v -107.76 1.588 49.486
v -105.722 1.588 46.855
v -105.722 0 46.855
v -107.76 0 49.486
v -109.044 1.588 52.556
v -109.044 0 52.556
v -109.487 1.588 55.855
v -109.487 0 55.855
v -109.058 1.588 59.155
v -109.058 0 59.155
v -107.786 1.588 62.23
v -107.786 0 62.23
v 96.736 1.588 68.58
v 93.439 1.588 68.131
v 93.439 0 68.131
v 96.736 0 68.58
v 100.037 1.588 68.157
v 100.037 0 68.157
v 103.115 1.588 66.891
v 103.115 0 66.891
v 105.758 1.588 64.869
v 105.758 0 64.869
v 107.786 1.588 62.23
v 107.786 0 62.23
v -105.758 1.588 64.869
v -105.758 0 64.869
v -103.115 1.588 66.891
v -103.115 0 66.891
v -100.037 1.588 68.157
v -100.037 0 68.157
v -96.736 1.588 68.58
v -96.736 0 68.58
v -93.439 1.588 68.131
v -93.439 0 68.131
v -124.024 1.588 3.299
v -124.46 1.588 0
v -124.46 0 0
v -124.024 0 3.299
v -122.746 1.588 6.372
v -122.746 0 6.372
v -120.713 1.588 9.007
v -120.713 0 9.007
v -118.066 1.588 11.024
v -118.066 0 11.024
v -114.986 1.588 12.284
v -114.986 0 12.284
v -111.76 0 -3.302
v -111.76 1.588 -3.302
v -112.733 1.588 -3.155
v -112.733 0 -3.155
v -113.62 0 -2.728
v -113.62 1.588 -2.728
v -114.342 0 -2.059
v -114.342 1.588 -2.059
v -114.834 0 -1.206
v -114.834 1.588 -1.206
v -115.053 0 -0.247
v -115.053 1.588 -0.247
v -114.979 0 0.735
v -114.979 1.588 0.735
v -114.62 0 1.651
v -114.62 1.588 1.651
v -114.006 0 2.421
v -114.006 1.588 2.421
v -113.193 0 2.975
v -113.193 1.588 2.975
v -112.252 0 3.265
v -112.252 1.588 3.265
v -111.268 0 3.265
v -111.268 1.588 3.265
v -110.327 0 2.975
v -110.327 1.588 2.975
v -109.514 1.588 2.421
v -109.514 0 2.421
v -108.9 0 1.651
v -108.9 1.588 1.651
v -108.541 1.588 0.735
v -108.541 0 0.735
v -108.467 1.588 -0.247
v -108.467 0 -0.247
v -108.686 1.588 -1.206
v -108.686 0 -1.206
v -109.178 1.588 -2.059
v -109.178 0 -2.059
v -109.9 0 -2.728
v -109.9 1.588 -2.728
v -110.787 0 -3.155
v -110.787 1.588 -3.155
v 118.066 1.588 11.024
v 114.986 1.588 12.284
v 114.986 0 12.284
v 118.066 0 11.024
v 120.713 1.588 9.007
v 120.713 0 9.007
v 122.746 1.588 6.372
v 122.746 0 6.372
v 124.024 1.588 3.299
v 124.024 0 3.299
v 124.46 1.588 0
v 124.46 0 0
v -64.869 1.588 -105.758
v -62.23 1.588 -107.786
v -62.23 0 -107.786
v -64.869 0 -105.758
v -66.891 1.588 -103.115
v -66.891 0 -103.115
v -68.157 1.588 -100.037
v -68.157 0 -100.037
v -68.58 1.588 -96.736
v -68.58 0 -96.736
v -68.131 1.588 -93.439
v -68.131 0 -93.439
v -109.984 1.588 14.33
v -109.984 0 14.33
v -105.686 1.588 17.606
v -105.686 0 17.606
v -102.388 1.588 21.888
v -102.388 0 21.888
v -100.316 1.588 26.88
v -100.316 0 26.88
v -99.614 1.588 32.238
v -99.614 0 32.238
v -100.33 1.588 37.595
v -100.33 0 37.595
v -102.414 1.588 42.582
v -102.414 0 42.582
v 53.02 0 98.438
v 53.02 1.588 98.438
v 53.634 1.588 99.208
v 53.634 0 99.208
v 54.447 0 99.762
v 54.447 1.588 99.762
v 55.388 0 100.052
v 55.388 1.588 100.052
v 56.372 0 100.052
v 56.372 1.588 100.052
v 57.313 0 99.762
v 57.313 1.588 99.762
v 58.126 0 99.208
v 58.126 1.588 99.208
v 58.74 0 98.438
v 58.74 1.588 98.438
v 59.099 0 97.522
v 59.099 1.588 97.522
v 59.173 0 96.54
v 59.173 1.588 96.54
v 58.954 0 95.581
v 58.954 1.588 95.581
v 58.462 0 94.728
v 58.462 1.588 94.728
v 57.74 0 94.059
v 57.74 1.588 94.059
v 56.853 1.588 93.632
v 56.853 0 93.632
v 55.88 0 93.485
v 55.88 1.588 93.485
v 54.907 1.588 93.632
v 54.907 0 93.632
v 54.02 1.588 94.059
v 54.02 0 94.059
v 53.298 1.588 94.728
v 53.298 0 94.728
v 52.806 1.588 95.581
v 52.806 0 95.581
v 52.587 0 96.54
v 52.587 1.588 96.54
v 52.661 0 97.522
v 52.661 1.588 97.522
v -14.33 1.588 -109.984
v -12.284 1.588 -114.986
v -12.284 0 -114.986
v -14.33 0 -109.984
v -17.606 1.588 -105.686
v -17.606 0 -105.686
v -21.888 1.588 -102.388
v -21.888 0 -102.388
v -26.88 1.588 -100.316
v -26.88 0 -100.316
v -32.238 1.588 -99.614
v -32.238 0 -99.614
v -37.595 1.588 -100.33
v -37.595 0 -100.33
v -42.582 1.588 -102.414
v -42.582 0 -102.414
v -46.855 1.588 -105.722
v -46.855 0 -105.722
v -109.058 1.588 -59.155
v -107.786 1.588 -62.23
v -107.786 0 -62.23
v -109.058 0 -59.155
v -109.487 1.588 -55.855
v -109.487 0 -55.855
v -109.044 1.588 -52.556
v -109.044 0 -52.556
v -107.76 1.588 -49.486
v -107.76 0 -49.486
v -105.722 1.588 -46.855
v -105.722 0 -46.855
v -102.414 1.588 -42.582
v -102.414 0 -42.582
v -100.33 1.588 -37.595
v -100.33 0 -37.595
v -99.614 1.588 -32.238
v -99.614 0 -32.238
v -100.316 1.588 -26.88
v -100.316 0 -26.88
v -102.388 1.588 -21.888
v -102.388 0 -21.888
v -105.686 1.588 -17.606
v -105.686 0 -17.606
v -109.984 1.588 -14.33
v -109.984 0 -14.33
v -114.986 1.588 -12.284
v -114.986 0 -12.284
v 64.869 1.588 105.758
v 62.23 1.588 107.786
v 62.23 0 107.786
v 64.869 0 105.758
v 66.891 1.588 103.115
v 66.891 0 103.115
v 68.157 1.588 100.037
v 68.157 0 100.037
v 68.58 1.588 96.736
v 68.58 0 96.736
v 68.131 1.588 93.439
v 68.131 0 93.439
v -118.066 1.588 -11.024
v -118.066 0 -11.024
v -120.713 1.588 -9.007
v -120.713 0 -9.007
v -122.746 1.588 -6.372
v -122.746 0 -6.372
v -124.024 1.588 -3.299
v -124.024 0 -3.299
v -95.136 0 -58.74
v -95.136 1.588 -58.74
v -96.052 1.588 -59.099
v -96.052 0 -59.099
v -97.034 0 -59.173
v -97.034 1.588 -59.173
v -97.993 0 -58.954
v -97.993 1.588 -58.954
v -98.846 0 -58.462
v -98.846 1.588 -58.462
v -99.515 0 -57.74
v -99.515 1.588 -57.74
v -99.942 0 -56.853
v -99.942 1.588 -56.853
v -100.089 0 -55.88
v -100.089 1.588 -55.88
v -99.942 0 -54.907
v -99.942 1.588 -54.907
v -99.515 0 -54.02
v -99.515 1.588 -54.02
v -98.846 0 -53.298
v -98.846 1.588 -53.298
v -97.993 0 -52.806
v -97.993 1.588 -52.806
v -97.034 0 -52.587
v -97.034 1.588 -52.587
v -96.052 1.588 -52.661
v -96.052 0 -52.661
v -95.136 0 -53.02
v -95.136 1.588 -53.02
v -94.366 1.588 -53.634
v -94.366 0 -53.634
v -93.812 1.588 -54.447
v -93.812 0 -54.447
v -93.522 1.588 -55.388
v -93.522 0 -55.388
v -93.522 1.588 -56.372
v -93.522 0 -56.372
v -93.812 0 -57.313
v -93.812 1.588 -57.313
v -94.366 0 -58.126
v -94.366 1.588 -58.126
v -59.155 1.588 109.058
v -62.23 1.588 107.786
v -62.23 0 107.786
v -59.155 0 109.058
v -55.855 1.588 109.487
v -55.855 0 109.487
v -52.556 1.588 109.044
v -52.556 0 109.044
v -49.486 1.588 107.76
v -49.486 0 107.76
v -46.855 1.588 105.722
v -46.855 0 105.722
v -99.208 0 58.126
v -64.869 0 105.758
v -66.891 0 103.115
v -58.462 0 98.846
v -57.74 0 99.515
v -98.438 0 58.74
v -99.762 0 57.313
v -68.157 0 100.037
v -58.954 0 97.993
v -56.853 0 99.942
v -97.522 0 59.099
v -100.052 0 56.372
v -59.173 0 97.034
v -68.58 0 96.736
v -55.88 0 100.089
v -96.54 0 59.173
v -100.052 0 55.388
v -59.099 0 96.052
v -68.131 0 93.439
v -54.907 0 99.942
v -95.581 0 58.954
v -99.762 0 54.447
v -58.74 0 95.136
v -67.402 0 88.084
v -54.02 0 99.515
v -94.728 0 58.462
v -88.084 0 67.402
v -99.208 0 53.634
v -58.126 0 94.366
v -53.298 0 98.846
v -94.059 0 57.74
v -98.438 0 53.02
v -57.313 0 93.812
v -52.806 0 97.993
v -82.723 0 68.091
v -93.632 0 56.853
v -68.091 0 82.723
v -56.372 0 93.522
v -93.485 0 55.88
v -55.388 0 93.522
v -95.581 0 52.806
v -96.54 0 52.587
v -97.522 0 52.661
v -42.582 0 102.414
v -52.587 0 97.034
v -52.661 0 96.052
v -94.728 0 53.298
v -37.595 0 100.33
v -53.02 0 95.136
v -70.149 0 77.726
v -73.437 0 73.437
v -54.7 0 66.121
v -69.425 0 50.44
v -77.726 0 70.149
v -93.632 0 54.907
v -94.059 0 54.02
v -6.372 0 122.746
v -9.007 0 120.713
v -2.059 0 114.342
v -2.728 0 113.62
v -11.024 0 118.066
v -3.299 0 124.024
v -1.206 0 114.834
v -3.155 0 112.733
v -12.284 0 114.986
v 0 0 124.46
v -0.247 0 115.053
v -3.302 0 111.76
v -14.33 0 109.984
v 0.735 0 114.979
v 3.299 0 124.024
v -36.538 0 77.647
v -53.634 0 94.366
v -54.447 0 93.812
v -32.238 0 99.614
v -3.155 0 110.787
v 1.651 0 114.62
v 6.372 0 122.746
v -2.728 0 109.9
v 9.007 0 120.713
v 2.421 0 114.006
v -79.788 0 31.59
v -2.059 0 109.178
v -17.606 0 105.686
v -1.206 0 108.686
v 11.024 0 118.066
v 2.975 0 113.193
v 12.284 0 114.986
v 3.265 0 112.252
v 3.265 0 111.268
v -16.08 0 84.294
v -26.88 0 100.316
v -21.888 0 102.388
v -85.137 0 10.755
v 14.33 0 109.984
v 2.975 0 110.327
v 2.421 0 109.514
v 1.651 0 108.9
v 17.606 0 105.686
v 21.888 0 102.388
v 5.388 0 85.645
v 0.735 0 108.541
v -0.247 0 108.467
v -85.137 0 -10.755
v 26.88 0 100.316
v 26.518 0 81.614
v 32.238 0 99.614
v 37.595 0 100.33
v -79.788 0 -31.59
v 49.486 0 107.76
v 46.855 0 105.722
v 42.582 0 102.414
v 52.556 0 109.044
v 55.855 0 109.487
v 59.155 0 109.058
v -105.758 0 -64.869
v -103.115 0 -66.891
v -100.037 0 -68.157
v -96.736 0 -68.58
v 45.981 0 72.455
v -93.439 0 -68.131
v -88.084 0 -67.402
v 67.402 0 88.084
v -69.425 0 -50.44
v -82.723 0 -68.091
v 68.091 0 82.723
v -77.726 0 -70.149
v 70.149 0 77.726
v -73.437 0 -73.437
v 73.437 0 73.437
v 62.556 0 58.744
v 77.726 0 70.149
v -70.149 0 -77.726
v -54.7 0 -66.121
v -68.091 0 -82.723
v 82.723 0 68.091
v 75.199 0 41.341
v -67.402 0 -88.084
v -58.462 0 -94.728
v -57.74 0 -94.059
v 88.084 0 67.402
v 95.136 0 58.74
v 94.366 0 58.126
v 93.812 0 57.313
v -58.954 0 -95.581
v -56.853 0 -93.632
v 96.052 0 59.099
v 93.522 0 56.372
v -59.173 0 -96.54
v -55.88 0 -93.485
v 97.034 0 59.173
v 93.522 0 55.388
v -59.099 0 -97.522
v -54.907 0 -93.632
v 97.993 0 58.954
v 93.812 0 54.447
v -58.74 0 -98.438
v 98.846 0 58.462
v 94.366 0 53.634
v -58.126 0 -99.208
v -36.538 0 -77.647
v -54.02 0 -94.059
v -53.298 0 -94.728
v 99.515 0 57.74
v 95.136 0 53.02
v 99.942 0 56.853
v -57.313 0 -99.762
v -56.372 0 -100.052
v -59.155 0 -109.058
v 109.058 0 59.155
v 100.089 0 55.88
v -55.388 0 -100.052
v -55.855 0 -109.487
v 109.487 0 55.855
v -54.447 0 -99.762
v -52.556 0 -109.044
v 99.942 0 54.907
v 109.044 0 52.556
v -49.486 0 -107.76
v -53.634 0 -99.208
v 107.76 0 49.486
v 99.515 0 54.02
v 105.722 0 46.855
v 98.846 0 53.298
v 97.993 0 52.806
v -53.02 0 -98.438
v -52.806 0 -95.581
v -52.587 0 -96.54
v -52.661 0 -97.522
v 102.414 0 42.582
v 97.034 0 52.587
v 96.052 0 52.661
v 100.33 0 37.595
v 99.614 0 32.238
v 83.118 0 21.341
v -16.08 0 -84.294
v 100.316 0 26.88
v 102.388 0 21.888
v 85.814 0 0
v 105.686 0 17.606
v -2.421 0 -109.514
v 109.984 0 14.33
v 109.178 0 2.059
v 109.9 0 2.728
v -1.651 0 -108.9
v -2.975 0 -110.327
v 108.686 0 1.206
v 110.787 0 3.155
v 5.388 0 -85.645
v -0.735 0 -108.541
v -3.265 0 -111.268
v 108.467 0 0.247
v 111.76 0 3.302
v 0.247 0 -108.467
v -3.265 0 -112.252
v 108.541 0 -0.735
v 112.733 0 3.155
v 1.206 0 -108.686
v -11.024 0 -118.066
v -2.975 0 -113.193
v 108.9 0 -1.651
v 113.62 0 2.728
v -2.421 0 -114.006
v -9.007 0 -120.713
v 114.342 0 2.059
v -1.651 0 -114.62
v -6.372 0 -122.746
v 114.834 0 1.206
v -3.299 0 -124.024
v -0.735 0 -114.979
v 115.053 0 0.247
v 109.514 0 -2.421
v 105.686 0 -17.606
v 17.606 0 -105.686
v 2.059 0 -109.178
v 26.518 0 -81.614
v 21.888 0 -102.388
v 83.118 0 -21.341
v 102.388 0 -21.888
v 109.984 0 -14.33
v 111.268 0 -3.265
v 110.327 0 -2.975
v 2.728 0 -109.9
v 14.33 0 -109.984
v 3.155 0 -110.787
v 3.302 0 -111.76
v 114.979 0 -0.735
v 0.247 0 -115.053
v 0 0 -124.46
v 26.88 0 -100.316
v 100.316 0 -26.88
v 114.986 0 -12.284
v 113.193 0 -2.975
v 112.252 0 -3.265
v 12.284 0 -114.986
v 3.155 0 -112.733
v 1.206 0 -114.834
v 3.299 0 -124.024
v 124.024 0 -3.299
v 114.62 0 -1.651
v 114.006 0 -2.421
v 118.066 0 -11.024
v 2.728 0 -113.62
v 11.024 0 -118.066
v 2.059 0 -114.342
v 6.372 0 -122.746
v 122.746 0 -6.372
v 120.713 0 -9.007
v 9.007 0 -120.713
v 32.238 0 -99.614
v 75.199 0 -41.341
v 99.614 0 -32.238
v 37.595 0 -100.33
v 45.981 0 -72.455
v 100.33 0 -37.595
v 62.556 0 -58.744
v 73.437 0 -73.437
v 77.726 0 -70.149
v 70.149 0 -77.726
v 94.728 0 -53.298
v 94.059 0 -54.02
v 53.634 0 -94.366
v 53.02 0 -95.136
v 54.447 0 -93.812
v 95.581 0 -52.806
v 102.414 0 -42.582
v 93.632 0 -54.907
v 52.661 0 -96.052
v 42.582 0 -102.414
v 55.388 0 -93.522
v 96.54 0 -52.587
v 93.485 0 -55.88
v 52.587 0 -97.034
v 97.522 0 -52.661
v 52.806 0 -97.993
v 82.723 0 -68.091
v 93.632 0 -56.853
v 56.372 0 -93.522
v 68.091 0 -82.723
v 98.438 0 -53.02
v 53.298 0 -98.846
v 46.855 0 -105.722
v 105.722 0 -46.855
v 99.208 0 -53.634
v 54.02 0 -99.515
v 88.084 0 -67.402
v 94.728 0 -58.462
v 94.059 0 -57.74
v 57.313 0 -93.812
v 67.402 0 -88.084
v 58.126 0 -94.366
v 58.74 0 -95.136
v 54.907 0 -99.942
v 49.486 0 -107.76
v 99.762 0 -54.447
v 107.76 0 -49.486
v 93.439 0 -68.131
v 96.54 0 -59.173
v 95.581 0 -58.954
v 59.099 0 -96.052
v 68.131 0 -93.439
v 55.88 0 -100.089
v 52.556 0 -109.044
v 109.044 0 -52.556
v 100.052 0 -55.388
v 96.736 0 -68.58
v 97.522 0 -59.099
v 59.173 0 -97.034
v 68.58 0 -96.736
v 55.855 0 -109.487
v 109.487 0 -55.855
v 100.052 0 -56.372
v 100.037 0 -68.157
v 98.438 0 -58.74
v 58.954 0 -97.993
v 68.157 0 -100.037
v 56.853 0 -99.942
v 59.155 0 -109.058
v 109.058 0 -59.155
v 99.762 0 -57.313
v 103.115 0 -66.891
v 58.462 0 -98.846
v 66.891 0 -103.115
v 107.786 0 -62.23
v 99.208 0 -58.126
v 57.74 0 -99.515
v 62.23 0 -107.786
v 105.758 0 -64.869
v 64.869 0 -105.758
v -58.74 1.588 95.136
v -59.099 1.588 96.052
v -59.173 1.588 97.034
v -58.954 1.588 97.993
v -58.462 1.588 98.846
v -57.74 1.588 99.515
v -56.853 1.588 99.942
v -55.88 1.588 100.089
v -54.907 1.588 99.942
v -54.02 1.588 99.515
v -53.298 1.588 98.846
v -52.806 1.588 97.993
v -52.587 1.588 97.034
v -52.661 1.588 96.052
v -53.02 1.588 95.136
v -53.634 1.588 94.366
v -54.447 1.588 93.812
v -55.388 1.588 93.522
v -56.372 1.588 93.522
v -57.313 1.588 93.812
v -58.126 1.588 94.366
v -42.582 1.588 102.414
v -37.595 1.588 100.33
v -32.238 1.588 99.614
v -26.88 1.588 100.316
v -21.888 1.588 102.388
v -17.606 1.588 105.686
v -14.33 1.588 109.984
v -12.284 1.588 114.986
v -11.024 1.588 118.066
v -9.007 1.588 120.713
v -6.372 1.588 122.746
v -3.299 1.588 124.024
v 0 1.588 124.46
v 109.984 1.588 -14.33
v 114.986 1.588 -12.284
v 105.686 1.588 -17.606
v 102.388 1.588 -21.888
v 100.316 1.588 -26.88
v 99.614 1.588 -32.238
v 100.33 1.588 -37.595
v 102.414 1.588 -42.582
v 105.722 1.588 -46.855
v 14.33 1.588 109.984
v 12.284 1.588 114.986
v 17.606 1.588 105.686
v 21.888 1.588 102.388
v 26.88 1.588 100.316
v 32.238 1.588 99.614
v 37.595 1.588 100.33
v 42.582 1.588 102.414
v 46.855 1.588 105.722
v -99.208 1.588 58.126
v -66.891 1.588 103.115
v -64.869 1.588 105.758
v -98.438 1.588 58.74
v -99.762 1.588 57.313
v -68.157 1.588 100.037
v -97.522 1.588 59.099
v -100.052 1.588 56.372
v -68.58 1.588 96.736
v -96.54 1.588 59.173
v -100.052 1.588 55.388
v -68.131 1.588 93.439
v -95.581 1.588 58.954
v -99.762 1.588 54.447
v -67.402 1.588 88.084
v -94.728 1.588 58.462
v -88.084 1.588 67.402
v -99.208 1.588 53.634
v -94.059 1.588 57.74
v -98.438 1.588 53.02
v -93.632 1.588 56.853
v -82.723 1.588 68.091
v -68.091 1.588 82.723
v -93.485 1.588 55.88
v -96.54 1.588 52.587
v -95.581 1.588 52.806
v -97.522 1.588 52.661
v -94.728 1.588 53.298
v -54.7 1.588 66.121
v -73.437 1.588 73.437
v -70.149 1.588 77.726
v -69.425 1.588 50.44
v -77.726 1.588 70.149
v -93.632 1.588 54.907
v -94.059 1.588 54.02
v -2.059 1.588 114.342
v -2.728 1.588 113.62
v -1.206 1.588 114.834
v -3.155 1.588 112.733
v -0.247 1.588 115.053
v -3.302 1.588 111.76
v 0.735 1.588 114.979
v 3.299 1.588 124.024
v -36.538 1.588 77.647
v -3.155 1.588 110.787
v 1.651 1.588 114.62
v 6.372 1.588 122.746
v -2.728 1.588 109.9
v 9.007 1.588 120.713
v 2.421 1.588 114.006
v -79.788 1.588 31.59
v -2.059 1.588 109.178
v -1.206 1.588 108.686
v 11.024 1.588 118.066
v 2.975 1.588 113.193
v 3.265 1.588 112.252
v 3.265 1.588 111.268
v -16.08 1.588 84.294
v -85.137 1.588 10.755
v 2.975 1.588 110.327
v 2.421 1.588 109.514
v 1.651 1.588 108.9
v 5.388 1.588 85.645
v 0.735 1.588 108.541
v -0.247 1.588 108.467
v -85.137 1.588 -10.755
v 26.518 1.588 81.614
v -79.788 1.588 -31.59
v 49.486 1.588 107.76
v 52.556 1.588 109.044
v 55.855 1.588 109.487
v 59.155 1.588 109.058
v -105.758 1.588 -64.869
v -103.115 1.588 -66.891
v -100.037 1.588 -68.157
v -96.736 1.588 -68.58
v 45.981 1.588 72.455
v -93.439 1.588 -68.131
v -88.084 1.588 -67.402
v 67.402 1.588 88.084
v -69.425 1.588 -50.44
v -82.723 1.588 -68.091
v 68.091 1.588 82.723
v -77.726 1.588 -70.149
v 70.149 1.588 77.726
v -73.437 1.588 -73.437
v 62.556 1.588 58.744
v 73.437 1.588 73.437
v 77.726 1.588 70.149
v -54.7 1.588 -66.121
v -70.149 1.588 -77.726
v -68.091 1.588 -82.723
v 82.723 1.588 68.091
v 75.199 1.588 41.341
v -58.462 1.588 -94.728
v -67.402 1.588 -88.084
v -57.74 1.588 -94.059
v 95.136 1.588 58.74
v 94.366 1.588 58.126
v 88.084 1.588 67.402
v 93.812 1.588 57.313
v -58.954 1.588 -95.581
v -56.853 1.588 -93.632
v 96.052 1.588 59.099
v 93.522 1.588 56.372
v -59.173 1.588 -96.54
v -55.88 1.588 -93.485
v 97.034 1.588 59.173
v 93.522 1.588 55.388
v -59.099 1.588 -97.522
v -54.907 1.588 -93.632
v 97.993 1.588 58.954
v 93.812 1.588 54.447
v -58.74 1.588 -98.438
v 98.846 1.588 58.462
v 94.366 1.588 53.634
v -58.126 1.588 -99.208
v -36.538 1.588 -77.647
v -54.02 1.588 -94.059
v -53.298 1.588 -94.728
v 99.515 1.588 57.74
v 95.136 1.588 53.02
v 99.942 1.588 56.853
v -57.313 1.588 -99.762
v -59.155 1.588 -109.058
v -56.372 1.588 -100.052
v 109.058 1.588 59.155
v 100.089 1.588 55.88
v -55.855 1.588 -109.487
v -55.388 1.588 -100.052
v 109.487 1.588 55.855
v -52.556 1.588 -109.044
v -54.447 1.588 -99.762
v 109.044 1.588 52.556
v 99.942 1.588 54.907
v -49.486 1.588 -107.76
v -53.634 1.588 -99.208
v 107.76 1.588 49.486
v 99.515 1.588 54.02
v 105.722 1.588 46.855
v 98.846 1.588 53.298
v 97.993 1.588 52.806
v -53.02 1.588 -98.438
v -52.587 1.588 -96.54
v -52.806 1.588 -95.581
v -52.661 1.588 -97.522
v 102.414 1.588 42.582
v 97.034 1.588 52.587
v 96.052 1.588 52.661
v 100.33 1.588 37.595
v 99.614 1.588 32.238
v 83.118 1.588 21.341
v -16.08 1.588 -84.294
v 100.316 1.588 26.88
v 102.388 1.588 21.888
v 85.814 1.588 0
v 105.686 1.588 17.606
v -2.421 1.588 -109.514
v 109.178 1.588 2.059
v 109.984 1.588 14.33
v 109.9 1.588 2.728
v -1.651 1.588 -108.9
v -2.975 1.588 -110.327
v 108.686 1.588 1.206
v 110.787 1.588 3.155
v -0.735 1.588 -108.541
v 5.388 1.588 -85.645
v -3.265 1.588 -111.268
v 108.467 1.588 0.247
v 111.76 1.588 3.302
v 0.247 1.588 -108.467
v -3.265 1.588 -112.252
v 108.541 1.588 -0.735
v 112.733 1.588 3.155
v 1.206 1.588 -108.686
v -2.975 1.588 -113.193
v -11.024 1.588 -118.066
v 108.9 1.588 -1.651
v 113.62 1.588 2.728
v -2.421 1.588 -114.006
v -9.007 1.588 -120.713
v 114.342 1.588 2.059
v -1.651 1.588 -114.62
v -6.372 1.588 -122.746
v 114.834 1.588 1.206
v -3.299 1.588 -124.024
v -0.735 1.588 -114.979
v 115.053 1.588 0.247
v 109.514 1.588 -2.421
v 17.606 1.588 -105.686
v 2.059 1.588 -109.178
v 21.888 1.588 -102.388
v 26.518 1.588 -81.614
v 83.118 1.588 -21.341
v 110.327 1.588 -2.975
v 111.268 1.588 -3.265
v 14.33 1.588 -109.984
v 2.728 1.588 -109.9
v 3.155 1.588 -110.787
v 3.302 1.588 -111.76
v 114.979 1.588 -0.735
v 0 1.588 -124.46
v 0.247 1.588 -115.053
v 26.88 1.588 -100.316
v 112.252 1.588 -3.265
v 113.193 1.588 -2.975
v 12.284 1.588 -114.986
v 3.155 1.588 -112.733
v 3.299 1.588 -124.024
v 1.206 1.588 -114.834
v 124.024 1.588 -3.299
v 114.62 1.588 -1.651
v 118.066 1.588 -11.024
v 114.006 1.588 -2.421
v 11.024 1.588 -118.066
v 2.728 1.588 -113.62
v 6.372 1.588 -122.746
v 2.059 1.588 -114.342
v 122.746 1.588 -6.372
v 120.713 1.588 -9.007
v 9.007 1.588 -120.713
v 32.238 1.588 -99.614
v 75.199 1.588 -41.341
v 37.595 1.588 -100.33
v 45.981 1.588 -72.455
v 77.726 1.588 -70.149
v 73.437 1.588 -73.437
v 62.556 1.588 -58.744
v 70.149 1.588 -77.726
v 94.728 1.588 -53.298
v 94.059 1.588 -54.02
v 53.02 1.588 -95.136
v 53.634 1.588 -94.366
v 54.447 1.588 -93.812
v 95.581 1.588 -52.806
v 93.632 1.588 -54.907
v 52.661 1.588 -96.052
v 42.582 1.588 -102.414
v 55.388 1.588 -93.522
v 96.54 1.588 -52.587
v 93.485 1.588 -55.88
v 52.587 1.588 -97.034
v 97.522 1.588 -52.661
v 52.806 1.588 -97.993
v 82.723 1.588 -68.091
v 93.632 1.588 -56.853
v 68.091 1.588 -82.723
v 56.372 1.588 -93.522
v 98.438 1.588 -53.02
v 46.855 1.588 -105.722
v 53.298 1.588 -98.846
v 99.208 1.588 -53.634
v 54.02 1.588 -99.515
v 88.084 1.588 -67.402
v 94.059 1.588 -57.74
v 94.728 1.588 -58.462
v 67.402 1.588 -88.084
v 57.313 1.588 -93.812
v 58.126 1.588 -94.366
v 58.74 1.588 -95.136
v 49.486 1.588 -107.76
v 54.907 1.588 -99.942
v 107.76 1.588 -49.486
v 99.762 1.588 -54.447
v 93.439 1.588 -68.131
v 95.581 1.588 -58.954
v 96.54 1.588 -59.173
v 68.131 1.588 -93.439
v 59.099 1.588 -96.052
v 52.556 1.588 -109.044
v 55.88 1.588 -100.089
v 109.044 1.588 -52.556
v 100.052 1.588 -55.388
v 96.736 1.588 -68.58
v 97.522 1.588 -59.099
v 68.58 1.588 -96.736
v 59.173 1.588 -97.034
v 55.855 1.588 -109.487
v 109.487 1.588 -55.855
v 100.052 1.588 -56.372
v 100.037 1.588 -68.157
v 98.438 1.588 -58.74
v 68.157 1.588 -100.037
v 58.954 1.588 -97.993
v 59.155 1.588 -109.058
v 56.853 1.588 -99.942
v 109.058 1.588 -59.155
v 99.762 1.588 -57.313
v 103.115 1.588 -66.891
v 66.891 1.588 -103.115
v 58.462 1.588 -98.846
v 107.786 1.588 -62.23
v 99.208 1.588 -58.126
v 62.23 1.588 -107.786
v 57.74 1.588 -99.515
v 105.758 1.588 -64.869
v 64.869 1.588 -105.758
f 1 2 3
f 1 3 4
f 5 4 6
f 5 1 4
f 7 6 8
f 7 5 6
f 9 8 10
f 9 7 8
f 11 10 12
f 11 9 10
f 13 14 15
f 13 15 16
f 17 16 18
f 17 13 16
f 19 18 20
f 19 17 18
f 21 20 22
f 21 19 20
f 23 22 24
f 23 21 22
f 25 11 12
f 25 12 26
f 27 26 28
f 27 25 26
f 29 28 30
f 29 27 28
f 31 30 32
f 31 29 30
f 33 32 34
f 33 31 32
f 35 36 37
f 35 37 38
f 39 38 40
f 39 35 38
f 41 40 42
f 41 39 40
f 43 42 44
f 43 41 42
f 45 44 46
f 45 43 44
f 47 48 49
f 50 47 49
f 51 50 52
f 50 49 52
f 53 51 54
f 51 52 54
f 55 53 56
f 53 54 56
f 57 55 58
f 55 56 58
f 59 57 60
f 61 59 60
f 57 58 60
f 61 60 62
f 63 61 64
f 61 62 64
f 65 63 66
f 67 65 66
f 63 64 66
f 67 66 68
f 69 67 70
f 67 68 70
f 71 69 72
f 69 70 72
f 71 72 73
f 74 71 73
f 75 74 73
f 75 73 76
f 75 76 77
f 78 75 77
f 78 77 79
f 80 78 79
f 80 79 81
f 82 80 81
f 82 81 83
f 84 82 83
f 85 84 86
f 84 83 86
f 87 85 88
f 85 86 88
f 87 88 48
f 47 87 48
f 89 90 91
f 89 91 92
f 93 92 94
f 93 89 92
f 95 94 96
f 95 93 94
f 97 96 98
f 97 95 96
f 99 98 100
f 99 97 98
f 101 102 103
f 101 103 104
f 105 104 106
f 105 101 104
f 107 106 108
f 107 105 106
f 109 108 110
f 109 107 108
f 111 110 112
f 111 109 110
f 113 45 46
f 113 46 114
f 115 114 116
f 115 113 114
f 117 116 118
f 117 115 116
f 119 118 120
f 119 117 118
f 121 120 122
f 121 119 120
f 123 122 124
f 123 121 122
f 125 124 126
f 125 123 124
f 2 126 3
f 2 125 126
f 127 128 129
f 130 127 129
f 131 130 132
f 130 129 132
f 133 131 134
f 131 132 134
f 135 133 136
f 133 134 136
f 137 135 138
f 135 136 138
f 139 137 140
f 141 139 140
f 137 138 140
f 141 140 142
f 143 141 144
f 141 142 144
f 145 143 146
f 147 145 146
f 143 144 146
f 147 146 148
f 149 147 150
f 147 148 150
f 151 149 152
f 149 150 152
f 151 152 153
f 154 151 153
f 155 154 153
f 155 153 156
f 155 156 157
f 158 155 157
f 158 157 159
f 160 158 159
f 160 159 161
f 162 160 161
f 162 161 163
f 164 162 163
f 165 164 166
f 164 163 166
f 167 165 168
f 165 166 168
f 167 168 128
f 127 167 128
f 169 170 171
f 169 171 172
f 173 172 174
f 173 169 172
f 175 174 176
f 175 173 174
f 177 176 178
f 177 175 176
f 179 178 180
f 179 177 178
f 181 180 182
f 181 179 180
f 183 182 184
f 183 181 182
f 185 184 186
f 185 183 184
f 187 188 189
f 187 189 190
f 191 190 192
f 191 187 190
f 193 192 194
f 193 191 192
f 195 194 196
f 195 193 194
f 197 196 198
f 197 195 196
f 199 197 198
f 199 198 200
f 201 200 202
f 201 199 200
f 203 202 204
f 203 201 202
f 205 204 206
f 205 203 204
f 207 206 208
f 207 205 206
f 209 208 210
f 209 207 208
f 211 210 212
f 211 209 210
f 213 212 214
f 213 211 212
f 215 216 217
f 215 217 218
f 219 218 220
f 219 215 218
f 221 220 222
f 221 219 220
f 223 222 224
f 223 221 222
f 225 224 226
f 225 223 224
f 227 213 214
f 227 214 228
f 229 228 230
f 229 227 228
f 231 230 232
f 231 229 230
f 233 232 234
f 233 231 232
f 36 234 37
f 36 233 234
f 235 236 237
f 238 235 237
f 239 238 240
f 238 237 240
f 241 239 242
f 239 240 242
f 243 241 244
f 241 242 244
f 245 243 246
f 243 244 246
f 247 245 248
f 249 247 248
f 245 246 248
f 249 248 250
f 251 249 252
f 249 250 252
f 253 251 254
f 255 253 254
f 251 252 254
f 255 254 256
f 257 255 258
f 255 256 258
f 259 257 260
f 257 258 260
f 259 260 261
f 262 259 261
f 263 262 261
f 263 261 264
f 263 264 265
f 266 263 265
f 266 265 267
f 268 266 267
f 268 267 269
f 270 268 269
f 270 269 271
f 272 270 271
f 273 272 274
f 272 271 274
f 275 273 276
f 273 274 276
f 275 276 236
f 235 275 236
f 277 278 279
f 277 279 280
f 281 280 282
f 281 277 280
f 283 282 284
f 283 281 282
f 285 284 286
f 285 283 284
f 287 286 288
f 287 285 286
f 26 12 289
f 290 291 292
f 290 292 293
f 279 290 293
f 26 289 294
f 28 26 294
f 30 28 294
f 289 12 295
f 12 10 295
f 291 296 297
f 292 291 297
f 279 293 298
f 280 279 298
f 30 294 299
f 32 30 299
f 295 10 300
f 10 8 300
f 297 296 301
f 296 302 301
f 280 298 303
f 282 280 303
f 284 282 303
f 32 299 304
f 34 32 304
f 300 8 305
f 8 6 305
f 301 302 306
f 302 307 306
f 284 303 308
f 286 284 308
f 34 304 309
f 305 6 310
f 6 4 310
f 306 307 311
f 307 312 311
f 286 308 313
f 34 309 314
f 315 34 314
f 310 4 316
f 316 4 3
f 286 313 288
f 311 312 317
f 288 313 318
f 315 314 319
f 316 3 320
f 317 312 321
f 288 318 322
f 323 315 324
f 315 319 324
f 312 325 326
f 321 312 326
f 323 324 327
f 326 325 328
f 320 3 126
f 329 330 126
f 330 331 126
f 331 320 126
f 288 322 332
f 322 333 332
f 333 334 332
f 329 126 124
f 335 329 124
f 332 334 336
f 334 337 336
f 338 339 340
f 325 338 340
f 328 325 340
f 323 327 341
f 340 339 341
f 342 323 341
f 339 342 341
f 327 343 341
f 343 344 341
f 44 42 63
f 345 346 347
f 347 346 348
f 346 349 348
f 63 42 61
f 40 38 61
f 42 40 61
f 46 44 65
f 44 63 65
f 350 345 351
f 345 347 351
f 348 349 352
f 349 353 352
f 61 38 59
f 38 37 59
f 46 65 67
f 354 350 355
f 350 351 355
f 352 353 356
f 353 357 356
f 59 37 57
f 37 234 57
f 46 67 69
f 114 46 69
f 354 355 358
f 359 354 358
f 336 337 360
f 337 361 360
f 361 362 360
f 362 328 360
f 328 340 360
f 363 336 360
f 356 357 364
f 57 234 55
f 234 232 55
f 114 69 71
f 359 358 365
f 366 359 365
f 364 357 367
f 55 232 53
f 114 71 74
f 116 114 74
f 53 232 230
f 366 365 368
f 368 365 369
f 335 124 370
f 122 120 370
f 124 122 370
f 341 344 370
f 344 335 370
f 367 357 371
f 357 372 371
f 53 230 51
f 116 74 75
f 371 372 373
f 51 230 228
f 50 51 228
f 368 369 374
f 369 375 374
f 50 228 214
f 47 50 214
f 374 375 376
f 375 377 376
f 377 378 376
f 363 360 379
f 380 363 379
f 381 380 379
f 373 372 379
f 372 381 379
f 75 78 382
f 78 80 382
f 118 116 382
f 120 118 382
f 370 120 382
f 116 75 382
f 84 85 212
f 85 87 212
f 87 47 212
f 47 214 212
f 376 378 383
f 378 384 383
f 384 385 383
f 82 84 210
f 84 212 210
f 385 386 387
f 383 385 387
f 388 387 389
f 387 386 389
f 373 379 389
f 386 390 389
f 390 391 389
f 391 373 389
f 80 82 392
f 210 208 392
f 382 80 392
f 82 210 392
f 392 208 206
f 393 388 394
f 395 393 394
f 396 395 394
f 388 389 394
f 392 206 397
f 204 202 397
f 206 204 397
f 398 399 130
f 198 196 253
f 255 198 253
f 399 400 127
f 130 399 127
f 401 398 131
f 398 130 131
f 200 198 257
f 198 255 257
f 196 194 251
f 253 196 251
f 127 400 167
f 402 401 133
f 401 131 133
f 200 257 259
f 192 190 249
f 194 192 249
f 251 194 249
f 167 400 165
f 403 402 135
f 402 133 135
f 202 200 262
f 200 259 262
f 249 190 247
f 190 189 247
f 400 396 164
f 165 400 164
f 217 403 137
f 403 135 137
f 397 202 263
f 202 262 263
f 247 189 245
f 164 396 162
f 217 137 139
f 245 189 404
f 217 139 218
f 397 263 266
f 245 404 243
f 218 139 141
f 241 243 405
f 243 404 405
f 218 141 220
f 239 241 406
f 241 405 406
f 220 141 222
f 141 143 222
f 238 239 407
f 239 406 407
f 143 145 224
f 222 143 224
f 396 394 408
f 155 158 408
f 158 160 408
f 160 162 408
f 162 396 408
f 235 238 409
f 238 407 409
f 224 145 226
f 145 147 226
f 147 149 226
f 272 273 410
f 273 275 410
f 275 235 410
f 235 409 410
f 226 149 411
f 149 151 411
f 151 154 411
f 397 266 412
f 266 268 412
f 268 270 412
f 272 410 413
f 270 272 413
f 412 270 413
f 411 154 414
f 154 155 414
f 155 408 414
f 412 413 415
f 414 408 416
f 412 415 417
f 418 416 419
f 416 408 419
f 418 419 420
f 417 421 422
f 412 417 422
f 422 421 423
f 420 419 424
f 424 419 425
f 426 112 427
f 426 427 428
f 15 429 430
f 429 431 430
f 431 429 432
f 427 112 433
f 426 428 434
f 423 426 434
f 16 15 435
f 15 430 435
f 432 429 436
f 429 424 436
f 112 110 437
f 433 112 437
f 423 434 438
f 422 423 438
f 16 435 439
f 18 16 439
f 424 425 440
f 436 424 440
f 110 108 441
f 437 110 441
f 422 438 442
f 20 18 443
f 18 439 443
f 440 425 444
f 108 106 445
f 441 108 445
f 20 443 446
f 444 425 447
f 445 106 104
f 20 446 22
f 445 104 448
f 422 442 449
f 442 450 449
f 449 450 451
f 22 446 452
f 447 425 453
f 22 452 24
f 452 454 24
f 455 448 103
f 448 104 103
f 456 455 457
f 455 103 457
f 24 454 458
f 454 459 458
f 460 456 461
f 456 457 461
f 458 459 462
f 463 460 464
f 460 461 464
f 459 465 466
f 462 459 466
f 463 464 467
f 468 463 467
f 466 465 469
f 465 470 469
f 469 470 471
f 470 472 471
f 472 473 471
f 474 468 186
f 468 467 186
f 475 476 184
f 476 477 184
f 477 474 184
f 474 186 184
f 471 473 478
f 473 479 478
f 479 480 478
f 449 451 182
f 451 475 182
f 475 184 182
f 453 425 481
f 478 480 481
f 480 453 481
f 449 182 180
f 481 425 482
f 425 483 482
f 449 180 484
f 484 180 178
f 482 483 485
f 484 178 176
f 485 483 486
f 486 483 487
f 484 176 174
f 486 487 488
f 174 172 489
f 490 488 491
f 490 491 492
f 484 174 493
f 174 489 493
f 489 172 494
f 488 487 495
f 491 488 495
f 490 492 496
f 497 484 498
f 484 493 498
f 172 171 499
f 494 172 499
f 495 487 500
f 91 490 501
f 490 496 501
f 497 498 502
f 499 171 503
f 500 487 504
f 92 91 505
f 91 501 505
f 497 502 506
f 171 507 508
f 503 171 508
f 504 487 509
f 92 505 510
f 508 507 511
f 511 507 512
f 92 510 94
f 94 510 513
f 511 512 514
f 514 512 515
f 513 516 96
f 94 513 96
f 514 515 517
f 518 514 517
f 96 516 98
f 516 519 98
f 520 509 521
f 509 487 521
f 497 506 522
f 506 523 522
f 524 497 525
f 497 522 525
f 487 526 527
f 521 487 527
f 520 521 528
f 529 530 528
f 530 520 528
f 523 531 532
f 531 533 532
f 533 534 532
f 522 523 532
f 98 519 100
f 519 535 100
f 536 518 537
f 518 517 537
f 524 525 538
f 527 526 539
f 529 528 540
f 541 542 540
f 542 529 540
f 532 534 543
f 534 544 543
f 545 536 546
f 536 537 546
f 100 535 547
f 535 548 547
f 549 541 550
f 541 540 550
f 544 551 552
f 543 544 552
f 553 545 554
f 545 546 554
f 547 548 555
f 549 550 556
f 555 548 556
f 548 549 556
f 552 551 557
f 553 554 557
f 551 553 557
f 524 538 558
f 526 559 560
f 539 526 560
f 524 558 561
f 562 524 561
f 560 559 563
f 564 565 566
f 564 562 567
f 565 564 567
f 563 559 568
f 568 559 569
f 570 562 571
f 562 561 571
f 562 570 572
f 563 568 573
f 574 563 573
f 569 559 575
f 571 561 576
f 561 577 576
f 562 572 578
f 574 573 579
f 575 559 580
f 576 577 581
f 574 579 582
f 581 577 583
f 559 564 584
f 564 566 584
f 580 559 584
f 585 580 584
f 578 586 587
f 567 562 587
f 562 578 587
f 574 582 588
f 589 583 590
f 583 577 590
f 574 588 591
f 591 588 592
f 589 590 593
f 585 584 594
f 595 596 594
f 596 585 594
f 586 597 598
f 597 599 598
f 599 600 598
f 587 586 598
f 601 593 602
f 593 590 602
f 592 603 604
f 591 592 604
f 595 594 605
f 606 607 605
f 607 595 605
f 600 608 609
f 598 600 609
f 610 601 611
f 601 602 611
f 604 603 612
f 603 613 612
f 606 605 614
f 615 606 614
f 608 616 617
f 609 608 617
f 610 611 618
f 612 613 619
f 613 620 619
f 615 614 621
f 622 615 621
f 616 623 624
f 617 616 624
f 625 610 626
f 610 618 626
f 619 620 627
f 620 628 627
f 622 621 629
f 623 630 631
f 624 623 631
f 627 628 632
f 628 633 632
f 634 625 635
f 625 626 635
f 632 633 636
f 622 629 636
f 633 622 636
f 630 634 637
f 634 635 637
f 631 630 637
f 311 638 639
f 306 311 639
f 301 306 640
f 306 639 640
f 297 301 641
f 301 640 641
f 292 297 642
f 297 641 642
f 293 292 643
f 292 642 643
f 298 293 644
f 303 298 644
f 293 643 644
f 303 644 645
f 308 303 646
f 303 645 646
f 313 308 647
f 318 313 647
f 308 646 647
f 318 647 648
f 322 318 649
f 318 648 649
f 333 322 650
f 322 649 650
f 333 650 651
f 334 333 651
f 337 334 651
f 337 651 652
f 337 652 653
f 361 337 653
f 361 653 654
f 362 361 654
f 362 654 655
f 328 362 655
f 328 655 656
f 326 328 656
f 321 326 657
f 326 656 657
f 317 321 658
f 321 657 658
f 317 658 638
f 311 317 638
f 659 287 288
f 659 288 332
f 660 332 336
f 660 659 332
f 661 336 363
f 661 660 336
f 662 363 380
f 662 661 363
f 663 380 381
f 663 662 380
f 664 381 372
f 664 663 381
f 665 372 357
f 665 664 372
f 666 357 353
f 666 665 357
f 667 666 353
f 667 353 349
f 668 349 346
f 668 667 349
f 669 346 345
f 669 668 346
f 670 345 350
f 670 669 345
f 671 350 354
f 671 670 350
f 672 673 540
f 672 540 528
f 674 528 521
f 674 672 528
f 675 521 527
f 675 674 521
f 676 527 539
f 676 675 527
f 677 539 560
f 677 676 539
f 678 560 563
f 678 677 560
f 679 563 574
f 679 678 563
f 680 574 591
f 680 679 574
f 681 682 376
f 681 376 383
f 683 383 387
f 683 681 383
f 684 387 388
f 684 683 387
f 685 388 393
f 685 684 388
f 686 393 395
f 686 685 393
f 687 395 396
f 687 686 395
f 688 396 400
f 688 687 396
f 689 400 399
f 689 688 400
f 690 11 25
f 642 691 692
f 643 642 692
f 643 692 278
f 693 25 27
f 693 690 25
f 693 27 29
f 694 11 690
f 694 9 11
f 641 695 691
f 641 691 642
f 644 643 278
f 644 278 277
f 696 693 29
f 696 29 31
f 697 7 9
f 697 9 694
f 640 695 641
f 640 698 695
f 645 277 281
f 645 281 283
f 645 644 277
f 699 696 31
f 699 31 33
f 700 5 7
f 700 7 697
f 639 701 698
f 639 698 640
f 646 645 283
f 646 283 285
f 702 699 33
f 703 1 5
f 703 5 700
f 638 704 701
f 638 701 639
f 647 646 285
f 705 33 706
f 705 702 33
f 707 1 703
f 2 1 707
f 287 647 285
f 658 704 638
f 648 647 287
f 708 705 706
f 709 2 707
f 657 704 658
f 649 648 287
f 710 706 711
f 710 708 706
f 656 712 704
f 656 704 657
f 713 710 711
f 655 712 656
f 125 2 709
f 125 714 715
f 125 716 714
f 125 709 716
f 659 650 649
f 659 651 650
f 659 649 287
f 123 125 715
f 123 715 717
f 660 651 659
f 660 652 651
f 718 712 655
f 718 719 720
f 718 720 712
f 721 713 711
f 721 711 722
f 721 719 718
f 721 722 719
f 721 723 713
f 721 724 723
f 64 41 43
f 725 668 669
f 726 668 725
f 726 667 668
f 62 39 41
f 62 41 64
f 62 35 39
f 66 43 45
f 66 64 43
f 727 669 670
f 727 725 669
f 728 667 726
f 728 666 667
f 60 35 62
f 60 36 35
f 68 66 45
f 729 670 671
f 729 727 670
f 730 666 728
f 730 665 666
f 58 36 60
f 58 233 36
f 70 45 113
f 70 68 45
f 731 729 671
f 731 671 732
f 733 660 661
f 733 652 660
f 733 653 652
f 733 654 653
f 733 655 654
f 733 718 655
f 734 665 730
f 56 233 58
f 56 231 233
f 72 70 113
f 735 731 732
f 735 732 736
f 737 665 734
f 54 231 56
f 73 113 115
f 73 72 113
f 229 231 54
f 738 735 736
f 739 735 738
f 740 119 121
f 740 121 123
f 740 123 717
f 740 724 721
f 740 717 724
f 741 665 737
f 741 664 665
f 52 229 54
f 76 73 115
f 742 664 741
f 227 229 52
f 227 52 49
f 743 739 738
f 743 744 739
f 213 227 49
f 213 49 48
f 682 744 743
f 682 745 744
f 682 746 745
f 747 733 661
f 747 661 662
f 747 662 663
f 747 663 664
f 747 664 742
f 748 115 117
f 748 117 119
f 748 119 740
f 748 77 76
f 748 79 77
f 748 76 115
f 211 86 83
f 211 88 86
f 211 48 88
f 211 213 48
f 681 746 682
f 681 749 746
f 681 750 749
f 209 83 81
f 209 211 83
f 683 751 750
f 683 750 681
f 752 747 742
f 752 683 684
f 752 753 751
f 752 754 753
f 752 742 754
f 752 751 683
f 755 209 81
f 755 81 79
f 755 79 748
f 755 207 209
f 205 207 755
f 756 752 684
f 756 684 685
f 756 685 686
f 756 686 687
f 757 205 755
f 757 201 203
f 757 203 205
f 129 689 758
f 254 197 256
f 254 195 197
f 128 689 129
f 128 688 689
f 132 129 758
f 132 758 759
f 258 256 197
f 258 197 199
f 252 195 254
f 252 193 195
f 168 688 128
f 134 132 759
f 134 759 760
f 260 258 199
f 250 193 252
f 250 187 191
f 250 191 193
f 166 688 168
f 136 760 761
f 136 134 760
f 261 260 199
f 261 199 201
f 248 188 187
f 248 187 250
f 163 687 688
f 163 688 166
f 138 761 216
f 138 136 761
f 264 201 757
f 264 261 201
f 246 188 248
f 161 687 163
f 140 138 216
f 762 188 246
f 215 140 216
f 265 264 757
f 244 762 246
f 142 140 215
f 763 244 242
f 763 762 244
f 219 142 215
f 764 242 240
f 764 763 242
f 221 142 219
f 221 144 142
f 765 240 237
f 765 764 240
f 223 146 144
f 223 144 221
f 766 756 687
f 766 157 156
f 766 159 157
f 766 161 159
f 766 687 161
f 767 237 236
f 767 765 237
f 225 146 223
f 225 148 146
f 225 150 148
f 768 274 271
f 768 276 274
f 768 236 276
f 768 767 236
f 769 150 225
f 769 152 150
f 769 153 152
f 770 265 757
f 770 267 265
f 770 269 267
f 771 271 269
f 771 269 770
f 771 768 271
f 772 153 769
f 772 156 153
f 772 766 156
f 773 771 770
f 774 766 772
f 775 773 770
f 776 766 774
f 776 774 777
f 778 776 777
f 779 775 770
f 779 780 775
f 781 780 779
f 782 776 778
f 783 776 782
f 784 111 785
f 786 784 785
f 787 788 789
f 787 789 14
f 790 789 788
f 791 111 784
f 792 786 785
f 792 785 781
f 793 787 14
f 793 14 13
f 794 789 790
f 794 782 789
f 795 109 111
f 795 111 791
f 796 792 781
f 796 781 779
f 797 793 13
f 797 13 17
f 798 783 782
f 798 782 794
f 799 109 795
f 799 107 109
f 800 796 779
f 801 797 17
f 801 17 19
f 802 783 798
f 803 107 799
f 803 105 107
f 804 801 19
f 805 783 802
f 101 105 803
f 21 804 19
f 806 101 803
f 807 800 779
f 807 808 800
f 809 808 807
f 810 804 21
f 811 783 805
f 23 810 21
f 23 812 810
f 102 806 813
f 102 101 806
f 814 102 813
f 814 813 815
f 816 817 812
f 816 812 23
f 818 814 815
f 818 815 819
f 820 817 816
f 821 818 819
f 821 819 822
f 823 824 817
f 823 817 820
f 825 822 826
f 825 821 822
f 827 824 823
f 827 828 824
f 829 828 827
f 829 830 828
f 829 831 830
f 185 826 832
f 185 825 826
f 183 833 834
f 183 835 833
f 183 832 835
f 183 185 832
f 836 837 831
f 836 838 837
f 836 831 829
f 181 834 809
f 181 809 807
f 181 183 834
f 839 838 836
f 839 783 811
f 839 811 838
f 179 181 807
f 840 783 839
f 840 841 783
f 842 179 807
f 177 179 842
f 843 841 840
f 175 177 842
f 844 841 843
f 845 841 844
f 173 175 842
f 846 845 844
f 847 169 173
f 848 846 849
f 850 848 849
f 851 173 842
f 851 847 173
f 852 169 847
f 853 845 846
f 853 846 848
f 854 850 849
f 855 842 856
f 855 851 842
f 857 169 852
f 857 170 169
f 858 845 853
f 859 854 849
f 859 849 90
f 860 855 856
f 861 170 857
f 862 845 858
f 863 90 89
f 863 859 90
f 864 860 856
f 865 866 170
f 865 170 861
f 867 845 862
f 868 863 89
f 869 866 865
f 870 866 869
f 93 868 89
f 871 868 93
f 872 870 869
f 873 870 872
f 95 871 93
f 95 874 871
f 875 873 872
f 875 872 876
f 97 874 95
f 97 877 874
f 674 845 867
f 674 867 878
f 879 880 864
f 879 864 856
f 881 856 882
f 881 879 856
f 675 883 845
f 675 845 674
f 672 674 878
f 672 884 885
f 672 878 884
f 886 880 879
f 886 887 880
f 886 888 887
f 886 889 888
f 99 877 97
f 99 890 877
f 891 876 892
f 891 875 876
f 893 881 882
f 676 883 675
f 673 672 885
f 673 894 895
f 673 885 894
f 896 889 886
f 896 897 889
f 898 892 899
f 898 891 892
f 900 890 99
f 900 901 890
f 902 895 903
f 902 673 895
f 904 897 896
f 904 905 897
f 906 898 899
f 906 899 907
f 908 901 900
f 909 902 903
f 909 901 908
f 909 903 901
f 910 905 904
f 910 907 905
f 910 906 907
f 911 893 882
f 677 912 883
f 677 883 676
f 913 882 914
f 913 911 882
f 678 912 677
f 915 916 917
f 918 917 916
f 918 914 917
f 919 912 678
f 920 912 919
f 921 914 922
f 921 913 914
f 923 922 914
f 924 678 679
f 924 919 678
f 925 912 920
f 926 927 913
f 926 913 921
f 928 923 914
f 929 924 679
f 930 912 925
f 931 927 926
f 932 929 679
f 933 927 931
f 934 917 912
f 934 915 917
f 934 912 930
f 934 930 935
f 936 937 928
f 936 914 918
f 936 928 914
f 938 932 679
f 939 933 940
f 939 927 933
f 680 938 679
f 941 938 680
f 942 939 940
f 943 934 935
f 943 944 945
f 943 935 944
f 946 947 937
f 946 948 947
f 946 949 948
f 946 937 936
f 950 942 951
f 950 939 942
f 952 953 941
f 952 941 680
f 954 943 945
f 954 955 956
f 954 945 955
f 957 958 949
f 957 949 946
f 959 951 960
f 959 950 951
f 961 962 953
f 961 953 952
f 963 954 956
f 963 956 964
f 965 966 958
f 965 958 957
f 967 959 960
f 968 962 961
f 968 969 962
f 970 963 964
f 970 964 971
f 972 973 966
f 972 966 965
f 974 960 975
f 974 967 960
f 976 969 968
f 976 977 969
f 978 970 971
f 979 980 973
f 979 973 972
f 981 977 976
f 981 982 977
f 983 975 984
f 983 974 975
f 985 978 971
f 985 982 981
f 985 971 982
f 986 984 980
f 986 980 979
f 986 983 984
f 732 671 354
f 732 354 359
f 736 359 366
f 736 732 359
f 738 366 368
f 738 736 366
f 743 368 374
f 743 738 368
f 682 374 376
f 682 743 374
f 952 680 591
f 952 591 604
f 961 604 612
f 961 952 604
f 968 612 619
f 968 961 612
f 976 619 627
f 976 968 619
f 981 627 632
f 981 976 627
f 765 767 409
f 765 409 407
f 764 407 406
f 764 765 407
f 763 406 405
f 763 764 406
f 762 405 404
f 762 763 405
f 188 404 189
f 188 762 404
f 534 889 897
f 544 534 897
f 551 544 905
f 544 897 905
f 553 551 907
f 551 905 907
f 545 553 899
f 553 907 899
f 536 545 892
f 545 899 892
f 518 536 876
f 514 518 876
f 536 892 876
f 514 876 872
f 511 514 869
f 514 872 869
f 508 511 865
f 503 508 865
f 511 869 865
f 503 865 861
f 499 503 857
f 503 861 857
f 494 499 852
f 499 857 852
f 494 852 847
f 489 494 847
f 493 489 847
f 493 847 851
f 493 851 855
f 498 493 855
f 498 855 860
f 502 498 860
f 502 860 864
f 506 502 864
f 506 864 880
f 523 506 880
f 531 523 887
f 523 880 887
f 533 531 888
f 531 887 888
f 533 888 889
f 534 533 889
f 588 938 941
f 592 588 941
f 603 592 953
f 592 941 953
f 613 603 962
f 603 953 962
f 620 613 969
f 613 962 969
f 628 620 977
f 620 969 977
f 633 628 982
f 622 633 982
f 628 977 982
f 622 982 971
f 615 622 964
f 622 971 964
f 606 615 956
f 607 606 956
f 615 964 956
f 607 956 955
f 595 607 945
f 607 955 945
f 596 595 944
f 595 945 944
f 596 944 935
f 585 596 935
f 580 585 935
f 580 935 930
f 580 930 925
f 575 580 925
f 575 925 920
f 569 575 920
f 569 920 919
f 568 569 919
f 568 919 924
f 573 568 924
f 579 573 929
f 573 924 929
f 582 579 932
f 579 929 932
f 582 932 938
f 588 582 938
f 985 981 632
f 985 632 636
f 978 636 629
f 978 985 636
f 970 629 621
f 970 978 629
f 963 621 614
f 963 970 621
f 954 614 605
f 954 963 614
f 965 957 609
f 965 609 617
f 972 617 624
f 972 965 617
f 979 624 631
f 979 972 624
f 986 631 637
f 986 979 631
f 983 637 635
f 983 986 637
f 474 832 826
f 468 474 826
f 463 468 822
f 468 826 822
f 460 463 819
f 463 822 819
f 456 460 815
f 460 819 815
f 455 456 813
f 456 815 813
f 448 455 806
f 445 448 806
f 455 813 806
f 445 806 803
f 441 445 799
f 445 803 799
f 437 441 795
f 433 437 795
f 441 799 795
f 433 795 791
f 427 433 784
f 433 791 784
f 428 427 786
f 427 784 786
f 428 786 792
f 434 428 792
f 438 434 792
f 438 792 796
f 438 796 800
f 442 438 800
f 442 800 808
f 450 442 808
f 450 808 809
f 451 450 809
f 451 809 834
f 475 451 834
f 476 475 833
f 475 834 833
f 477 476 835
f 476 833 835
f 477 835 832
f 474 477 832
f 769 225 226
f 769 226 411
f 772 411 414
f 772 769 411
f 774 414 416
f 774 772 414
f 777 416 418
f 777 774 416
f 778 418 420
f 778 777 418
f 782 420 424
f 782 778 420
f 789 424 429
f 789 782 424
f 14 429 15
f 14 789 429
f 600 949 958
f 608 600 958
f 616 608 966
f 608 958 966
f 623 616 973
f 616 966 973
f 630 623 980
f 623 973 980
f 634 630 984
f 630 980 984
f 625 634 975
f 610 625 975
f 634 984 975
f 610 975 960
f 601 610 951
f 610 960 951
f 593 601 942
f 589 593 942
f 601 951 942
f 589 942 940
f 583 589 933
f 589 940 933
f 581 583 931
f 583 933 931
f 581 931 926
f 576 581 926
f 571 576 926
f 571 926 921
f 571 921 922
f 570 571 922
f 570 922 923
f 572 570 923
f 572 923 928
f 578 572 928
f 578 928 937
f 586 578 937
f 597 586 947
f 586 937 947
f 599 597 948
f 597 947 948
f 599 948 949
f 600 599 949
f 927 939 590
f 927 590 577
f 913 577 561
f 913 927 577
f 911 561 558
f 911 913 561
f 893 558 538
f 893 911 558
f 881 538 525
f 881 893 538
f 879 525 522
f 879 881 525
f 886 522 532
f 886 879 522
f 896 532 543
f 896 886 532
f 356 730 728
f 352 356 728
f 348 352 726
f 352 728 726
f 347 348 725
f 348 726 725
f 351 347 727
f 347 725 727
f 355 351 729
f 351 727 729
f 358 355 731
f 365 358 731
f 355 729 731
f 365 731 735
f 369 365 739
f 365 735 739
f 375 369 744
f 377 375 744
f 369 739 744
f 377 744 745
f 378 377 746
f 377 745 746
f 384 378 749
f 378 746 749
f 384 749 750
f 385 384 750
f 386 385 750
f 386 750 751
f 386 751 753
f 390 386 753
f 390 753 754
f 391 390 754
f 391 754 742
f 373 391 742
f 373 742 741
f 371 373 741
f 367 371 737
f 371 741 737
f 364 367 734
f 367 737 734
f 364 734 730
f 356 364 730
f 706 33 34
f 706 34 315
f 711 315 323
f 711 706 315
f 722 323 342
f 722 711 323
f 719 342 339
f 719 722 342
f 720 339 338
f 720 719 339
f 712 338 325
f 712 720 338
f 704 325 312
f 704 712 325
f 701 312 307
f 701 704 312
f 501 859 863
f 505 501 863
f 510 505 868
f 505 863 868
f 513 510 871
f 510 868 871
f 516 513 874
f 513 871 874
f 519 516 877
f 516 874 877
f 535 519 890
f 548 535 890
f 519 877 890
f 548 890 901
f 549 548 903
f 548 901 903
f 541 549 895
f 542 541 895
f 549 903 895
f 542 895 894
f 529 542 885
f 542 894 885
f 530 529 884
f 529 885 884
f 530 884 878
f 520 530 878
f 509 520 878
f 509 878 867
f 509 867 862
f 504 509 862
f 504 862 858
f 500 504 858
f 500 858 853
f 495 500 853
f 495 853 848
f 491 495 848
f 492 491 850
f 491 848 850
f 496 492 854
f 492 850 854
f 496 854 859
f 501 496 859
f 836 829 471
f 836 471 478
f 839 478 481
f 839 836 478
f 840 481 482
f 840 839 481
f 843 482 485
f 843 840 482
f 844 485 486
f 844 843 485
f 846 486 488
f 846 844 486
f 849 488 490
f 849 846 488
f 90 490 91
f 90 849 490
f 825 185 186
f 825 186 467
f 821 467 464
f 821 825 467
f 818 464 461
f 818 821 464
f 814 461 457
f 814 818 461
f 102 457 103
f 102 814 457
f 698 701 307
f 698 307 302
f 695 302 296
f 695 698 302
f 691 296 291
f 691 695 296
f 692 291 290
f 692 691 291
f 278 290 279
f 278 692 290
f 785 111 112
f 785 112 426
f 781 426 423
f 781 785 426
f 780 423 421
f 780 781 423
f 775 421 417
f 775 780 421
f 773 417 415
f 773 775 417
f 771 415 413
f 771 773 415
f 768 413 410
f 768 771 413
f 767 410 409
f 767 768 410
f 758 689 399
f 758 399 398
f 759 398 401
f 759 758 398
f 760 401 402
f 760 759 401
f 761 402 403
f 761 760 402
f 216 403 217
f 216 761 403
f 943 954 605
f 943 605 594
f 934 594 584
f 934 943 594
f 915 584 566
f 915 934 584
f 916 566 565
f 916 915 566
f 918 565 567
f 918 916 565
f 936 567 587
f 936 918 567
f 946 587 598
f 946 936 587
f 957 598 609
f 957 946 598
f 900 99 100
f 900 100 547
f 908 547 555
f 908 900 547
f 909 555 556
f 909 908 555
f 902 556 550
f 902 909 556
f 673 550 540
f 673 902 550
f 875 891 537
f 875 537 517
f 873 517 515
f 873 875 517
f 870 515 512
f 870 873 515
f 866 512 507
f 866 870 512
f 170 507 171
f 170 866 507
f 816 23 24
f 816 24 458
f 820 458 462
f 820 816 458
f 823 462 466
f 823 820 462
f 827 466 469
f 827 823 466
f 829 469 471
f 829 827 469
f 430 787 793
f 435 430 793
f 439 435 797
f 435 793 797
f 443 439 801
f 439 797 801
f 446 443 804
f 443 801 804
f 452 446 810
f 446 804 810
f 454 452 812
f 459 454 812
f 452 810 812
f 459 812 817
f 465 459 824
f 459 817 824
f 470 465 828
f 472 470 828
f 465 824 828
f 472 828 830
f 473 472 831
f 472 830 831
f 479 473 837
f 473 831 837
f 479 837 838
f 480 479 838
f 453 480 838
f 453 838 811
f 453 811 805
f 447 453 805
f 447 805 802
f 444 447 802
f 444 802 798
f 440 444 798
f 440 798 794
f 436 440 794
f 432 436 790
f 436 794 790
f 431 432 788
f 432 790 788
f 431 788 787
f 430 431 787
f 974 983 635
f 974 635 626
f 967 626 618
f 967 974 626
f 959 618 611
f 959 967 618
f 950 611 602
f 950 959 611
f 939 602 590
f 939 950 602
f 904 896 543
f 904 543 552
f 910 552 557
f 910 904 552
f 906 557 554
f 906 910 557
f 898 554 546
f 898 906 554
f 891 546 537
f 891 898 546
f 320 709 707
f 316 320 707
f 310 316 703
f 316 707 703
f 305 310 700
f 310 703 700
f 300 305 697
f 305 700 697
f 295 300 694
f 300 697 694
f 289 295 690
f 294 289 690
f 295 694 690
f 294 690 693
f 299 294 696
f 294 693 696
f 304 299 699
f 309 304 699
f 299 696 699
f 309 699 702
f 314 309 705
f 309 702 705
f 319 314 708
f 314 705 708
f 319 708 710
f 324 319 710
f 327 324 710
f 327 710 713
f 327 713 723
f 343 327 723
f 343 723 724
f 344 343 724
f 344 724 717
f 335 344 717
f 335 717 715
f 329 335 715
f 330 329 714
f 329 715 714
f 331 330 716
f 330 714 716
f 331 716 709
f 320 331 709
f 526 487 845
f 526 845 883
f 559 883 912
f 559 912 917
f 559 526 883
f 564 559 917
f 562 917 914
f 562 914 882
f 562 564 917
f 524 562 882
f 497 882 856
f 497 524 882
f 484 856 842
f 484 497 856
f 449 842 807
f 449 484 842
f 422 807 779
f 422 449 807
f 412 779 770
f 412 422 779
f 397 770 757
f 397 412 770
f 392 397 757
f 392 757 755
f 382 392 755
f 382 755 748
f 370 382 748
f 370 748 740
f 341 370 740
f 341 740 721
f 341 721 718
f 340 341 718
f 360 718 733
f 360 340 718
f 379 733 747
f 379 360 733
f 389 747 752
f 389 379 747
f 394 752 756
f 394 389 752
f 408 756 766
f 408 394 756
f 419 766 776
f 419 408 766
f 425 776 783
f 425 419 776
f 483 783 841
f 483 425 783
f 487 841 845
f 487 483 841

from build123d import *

# Parameters (mm, degrees)
SKETCH1_R           = 124.46
SKETCH1_R_2         = 85.8139
BOSS_EXTRUDE1_DEPTH = 1.5875
CUT_EXTRUDE1_REACH  = 178.02
SKETCH2_R           = 3.302
CIRPATTERN1_COUNT   = 12
CUT_EXTRUDE2_REACH  = 178.02
CIRPATTERN2_COUNT   = 12


with BuildPart() as part:
    # Sketch1 → Boss-Extrude1 (new body)
    with BuildSketch(Plane(origin=(0, 0, 0), x_dir=(1, 0, 0), z_dir=(0, 1, 0))):
        Circle(SKETCH1_R)
        Circle(SKETCH1_R_2, mode=Mode.SUBTRACT)
    extrude(amount=BOSS_EXTRUDE1_DEPTH)

    # Sketch2 → Cut-Extrude1 (cut, up to next)
    with BuildSketch(Plane(origin=(0, 1.5875, 0), x_dir=(1, 0, 0), z_dir=(0, 1, 0)), mode=Mode.PRIVATE) as cut_extrude1_sk1:
        with Locations((0, 111.76)):
            Circle(SKETCH2_R)
    cut_extrude1_tool1 = extrude(cut_extrude1_sk1.sketch, amount=-CUT_EXTRUDE1_REACH, mode=Mode.PRIVATE) & part.part
    cut_extrude1 = cut_extrude1_tool1.solids().sort_by_distance((0, 1.5875, -111.76))[0]
    add(cut_extrude1, mode=Mode.SUBTRACT)

    # CirPattern1: Cut-Extrude1 ×12 about axis
    cirpattern1_axis = Axis((0, 1.5875, 0), (0, -1, 0))
    for i in range(1, CIRPATTERN1_COUNT):
        add(cut_extrude1.rotate(cirpattern1_axis, i * 360 / CIRPATTERN1_COUNT), mode=Mode.SUBTRACT)

    # Sketch4 → Cut-Extrude2 (cut, up to next)
    with BuildSketch(Plane(origin=(0, 1.5875, 0), x_dir=(1, 0, 0), z_dir=(0, 1, 0)), mode=Mode.PRIVATE) as cut_extrude2_sk1:
        with BuildLine():
            Line((0, 124.46), (0, 155.146488396))
            Line((0, 155.146488396), (77.573244198, 134.360800259))
            Line((77.573244198, 134.360800259), (62.23, 107.785521755))
            ThreePointArc((62.23, 107.785521755), (54.190877213, 109.374169747), (46.855001911, 105.722289245))
            ThreePointArc((46.855001911, 105.722289245), (26.879703963, 100.316420883), (12.283522673, 114.985689189))
            ThreePointArc((12.283522673, 114.985689189), (7.756408554, 121.816248125), (0, 124.46))
        make_face()
    cut_extrude2_tool1 = extrude(cut_extrude2_sk1.sketch, amount=-CUT_EXTRUDE2_REACH, mode=Mode.PRIVATE) & part.part
    cut_extrude2 = cut_extrude2_tool1.solids().sort_by_distance((33.999093, 1.5875, -126.886343))[0]
    add(cut_extrude2, mode=Mode.SUBTRACT)

    # CirPattern2: Cut-Extrude2 ×12 about axis
    cirpattern2_axis = Axis((0, 1.5875, 0), (0, -1, 0))
    for i in range(1, CIRPATTERN2_COUNT):
        add(cut_extrude2.rotate(cirpattern2_axis, i * 360 / CIRPATTERN2_COUNT), mode=Mode.SUBTRACT)


solid = part.part
